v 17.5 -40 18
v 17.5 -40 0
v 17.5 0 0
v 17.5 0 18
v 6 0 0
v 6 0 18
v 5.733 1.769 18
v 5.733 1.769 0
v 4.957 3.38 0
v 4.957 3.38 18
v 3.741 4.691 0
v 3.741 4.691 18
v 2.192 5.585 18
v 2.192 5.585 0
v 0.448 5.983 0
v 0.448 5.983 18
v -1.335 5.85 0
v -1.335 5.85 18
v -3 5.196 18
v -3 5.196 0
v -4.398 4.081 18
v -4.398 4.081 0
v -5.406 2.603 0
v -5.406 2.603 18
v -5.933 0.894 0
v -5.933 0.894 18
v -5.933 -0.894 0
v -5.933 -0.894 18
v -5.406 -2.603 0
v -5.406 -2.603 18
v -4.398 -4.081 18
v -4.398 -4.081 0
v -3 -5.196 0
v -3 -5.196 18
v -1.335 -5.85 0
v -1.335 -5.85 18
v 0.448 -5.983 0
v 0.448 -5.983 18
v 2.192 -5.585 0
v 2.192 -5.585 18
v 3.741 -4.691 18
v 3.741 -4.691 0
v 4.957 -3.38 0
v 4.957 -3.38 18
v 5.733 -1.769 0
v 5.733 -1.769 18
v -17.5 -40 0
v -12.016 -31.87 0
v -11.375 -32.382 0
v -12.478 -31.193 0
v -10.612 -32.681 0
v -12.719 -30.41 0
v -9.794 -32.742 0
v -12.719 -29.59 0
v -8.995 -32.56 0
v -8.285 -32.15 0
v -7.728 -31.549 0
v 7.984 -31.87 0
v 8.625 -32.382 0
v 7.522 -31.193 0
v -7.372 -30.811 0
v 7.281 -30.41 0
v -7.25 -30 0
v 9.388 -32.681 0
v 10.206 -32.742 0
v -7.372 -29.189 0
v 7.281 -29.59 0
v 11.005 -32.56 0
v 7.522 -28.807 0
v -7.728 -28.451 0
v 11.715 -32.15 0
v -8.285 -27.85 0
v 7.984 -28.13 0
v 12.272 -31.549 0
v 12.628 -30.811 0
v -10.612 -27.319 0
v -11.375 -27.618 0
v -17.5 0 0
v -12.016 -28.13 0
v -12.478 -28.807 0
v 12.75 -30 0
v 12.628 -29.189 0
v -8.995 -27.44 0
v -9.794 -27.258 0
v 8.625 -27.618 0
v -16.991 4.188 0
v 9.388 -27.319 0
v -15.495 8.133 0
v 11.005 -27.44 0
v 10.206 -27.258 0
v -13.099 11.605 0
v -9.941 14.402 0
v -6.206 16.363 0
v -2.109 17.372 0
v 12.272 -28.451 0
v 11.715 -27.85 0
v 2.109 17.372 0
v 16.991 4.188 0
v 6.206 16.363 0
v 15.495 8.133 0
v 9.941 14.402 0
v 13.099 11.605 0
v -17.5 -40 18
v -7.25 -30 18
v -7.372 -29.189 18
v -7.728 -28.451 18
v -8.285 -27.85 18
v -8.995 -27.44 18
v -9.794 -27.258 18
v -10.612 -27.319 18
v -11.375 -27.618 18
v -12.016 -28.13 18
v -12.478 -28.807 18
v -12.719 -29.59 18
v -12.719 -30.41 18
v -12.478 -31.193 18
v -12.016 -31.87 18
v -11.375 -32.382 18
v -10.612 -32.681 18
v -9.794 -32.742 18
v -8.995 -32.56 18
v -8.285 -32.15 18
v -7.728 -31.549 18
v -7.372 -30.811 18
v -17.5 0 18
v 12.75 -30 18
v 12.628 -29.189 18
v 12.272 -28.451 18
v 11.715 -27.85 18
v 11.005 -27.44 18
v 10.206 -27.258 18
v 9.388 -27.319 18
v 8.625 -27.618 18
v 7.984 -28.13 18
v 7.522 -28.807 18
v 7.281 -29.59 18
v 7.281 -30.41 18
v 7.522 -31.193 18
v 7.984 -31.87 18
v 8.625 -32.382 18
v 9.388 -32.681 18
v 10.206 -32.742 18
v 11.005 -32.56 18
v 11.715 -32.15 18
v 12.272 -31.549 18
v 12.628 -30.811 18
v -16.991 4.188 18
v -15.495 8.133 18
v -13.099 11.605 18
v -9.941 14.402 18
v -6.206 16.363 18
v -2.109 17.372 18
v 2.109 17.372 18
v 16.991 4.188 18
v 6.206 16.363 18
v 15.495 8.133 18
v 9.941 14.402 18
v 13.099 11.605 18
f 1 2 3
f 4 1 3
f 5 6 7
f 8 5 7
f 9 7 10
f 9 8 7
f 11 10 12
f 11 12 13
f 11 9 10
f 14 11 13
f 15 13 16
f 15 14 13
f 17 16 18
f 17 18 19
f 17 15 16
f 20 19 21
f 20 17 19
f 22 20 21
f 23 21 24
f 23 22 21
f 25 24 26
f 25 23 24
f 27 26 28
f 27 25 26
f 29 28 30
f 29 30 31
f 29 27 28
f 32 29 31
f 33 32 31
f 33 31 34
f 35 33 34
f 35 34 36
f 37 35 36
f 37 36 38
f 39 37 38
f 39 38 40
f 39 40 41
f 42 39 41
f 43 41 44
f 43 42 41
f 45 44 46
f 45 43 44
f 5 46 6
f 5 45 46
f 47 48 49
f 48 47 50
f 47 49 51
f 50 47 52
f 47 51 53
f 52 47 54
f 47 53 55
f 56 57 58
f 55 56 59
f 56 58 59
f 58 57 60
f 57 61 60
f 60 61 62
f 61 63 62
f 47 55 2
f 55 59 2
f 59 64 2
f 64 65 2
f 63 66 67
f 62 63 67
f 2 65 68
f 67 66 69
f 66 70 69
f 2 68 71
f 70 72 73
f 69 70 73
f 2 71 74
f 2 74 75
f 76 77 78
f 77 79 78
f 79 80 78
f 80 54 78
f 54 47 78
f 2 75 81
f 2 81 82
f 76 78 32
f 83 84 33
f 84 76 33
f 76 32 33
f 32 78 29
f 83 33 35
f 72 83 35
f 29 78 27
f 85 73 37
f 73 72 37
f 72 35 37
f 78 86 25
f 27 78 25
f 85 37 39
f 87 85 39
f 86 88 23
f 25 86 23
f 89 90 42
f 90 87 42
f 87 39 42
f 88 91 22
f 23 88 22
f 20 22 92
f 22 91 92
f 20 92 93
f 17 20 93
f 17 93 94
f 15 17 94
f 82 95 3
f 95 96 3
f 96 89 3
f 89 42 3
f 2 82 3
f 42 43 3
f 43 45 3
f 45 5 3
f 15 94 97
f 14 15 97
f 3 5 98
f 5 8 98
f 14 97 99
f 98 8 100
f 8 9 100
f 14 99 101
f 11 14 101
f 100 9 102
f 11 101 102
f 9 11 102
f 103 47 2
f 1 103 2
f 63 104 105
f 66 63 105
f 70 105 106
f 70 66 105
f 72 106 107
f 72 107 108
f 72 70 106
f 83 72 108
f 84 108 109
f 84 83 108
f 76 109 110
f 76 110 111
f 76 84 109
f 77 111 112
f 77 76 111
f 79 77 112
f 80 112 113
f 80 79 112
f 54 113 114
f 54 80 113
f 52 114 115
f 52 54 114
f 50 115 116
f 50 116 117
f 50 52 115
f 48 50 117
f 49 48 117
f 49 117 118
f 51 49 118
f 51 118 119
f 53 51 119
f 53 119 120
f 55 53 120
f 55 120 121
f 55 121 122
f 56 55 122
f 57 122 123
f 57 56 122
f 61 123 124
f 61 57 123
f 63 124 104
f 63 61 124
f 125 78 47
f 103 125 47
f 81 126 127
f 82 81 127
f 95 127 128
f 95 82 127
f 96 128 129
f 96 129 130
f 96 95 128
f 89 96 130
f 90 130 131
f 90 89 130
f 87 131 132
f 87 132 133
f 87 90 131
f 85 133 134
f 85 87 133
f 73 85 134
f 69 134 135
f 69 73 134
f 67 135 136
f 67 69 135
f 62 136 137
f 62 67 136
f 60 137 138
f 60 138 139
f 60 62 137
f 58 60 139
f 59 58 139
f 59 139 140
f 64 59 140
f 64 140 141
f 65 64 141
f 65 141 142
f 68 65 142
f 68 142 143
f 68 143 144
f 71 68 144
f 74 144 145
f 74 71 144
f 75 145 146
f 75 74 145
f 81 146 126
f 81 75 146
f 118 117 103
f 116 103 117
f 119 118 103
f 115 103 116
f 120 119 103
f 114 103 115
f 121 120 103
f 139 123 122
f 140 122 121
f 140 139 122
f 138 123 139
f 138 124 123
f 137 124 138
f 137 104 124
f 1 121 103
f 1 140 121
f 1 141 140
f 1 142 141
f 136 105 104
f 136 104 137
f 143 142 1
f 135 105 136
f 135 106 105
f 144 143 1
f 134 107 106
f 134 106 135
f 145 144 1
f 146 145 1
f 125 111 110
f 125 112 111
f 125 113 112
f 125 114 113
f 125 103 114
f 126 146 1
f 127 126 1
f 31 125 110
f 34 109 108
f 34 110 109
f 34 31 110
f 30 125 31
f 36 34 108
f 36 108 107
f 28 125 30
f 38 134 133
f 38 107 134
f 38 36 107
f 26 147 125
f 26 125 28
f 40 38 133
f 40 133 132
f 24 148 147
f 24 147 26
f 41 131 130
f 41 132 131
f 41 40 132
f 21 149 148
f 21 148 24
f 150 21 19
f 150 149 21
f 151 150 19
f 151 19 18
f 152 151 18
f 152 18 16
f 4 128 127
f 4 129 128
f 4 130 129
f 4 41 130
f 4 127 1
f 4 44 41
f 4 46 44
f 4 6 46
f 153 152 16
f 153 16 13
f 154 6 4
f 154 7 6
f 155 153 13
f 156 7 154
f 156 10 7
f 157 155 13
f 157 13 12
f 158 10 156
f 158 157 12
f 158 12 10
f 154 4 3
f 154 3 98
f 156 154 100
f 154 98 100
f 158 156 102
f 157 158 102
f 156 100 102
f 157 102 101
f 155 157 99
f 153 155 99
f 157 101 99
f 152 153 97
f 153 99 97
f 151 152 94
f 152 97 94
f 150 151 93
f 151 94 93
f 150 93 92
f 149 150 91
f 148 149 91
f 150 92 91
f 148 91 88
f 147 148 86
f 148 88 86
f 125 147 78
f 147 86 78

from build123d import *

# Parameters (mm, degrees)
SKETCH_1_R      = 6
SKETCH_1_R_2    = 2.75
EXTRUDE_1_DEPTH = 18


with BuildPart() as part:
    # 草图1 → 凸台-拉伸1 (new body)
    with BuildSketch(Plane.XY):
        with BuildLine():
            Line((-17.5, 0), (-17.5, -40))
            Line((-17.5, -40), (17.5, -40))
            Line((17.5, -40), (17.5, 0))
            ThreePointArc((17.5, 0), (0, 17.5), (-17.5, 0))
        make_face()
        Circle(SKETCH_1_R, mode=Mode.SUBTRACT)
        with Locations((-10, -30)):
            Circle(SKETCH_1_R_2, mode=Mode.SUBTRACT)
        with Locations((10, -30)):
            Circle(SKETCH_1_R_2, mode=Mode.SUBTRACT)
    extrude(amount=EXTRUDE_1_DEPTH)


solid = part.part
